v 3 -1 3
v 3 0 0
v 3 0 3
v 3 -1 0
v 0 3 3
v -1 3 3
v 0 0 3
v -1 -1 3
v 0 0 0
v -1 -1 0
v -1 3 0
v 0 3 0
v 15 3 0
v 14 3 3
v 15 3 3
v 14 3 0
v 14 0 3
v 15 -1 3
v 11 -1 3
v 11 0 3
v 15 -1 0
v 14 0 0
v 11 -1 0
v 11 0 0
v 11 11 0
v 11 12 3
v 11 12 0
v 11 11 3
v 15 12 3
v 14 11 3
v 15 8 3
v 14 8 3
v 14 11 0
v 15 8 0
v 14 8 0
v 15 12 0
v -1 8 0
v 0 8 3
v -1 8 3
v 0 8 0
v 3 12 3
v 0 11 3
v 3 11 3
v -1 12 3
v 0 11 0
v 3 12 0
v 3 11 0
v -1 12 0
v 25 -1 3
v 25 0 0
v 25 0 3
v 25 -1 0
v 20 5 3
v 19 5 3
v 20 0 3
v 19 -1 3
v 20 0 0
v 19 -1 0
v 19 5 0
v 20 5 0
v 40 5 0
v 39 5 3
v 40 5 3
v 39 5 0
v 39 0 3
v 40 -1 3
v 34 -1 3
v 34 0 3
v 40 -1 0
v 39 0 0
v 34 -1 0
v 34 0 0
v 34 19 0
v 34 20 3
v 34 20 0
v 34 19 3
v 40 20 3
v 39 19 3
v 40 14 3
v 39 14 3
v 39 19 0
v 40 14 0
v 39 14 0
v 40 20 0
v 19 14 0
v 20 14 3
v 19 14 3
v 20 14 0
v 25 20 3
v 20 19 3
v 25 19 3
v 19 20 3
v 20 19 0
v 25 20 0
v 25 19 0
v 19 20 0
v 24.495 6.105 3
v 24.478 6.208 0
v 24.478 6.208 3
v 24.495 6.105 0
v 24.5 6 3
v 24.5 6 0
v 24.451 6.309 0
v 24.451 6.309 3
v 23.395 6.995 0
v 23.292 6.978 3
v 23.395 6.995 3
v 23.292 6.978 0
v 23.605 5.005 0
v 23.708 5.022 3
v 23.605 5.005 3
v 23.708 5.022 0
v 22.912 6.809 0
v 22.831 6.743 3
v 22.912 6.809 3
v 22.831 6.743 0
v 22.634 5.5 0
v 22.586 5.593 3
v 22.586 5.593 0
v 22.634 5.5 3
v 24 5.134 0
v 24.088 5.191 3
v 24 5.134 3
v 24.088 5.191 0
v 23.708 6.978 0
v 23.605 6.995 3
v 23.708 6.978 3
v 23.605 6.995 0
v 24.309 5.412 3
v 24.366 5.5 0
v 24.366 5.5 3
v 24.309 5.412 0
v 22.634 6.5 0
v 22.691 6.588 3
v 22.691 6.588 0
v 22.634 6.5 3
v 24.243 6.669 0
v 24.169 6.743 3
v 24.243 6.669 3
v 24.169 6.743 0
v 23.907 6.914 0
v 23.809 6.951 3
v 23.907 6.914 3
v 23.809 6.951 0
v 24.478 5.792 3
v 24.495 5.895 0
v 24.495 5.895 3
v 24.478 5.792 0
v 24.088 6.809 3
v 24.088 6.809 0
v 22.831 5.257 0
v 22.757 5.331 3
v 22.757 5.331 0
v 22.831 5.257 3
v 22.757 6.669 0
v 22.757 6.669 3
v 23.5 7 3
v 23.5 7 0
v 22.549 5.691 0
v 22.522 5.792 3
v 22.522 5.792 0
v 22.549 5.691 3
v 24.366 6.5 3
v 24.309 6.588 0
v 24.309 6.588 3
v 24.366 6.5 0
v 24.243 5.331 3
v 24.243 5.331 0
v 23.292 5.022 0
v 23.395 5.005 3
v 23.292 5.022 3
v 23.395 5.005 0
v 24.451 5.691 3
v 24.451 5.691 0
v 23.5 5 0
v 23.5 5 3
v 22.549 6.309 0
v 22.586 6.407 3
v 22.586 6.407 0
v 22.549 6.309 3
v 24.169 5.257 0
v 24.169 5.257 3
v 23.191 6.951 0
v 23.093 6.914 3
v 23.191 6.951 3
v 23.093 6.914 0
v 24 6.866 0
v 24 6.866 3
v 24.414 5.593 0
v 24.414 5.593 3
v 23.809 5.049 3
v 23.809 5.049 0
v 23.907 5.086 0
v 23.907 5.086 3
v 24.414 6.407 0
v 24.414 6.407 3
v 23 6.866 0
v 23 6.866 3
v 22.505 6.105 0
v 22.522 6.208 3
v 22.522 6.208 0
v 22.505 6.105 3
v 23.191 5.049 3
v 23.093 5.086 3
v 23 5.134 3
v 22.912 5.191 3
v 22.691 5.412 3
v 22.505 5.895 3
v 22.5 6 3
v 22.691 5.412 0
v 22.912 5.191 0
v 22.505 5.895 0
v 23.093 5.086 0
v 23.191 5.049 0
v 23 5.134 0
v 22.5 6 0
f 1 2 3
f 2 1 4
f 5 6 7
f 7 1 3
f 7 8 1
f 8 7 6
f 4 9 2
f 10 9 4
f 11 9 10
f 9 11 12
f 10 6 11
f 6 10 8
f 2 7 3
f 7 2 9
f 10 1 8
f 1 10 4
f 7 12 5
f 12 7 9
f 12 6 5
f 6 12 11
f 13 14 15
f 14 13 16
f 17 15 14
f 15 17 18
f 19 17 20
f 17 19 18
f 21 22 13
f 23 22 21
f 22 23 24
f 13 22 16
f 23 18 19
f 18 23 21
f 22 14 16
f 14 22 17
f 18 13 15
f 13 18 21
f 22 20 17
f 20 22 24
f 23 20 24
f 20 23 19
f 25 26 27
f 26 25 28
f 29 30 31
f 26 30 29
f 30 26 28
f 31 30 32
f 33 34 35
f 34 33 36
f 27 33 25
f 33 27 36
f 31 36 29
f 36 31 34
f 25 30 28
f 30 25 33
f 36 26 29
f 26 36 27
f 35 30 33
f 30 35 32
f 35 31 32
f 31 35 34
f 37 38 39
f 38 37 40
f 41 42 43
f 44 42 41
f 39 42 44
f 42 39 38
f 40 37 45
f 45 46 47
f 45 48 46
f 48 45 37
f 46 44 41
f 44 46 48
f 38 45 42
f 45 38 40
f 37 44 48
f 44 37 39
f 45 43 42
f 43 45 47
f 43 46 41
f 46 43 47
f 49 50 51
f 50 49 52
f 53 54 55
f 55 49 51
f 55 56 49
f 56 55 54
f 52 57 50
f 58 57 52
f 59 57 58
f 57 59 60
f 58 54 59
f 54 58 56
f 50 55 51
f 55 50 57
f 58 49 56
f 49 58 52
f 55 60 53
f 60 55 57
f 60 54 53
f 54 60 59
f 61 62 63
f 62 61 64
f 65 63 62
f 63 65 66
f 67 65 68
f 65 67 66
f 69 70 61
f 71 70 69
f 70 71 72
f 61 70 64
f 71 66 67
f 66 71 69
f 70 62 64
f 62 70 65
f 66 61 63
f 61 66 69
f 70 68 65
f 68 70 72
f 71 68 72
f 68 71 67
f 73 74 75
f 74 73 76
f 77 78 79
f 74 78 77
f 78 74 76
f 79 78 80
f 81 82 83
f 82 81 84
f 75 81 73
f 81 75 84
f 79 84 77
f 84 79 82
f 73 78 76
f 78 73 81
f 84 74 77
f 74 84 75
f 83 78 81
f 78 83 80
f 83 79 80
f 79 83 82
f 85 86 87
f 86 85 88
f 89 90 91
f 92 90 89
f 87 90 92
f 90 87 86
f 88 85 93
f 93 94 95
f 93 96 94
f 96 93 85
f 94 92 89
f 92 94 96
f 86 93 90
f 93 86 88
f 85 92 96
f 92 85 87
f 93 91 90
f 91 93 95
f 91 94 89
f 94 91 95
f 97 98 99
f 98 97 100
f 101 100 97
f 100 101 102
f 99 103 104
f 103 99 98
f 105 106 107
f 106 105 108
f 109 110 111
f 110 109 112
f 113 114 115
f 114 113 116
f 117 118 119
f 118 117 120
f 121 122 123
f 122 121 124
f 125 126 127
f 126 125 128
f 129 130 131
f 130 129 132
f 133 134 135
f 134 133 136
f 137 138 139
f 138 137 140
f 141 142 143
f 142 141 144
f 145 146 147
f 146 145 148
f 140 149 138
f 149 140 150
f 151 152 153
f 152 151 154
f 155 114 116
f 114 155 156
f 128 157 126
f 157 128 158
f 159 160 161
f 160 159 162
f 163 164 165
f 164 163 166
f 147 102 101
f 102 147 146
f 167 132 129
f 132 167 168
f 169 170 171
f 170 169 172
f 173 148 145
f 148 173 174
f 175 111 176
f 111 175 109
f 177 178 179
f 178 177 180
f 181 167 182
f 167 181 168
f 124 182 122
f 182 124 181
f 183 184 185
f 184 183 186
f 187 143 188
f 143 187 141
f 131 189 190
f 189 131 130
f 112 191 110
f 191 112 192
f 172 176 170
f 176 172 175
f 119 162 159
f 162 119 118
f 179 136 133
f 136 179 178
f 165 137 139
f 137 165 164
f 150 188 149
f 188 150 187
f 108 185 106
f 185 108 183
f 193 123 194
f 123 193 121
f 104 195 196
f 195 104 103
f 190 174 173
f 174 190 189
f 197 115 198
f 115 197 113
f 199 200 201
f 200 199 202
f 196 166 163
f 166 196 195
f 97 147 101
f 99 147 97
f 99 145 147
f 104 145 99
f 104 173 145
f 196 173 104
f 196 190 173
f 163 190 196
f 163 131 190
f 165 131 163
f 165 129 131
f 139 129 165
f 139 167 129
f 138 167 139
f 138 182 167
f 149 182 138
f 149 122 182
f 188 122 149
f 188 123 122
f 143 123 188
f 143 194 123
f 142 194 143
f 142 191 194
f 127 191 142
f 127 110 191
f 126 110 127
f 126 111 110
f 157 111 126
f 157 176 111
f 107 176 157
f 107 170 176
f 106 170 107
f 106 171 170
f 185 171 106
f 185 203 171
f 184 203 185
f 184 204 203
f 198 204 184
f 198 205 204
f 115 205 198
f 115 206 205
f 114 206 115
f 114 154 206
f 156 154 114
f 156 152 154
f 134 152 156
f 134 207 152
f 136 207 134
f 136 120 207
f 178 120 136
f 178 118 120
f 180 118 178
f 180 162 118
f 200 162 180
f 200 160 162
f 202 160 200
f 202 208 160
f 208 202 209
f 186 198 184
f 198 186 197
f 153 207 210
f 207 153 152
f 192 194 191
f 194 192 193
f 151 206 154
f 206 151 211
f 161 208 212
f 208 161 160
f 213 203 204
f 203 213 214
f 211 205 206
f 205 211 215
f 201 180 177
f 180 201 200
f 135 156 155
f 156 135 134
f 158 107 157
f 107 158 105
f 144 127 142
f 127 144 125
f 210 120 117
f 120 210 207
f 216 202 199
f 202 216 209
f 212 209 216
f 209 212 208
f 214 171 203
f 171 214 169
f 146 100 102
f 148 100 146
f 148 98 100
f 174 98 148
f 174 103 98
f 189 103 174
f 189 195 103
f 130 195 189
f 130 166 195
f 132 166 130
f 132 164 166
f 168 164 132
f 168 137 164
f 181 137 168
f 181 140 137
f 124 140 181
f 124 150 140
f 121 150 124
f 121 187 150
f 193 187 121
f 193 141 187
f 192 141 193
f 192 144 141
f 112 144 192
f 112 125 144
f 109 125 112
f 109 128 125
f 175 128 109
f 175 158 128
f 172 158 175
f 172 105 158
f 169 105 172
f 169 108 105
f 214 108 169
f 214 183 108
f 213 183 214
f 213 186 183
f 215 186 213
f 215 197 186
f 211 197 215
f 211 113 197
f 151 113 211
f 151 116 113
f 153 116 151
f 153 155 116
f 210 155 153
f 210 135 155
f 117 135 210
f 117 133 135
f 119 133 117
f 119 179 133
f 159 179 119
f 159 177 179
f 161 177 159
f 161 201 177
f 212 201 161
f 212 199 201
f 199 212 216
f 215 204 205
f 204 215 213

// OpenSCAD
// file: lib/corner_clips.scad
// 单个L形卡扣模块 - 安全版本
module four_corner_clips(chip_size, chip_pos, 
                         clip_thickness=1, arm_height=1, clip_length=2,
                         cylinders=undef) {
    
    // 参数验证和默认值处理
    actual_cylinders = (cylinders == undef) ? [] : cylinders;
    
    // 提取芯片参数
    chip_length = is_undef(chip_size[0]) ? 10 : chip_size[0];
    chip_width  = is_undef(chip_size[1]) ? 10 : chip_size[1];
    chip_thickness = is_undef(chip_size[2]) ? 1 : chip_size[2];
    
    chip_x = is_undef(chip_pos[0]) ? 0 : chip_pos[0];
    chip_y = is_undef(chip_pos[1]) ? 0 : chip_pos[1];
    chip_z = is_undef(chip_pos[2]) ? 0 : chip_pos[2];
    
    // 四个角卡扣
    // 左下角
    translate([chip_x - clip_thickness, chip_y - clip_thickness, chip_z])
        corner_clip(clip_length, clip_thickness, arm_height);

    // 右下角
    translate([chip_x + chip_length, chip_y - clip_thickness, chip_z])
        rotate([0,0,90])
        corner_clip(clip_length, clip_thickness, arm_height);

    // 右上角
    translate([chip_x + chip_length, chip_y + chip_width, chip_z])
        rotate([0,0,180])
        corner_clip(clip_length, clip_thickness, arm_height);

    // 左上角
    translate([chip_x - clip_thickness, chip_y + chip_width, chip_z])
        rotate([0,0,270])
        corner_clip(clip_length, clip_thickness, arm_height);

    // 圆柱体（可选）
    if (len(actual_cylinders) > 0) {
        for(i = [0:len(actual_cylinders)-1]) {
            cylinder_diameter = actual_cylinders[i][0];
            cylinder_height = actual_cylinders[i][1];
            cylinder_offset = actual_cylinders[i][2];
            
            translate([chip_x + cylinder_offset[0], chip_y + cylinder_offset[1], chip_z])
                cylinder(h=cylinder_height, d=cylinder_diameter, center=false, $fn=60);
        }
    }
}

// corner_clip 辅助模块
module corner_clip(length, thickness, height) {
    cube([length + thickness, thickness, height]);
    cube([thickness, length + thickness, height]);
}
// main file
use <lib/corner_clips.scad>;

// clip_thickness = 1;
// arm_height = 3;

// 调用示例
four_corner_clips(
    chip_size=[15, 12, 1.5],
    clip_thickness=1,
    arm_height=3,
    clip_length=3,
    chip_pos=[0,0,0]
);


// 测试调用
four_corner_clips(
    chip_size = [20, 20, 1],
    chip_pos = [20, 0, 0],
    clip_thickness=1,
    arm_height=3,
    clip_length=5,
    cylinders=[
        // [0.75, 3, [1.5, 1.5]],  // 第一个圆柱：直径2，高度3
        // [0.75, 3, [1.5, 10.5]], // 第二个圆柱：直径1.5，高度4
        [2, 3, [3.5, 6]] // 第二个圆柱：直径1.5，高度4
    ]
);
